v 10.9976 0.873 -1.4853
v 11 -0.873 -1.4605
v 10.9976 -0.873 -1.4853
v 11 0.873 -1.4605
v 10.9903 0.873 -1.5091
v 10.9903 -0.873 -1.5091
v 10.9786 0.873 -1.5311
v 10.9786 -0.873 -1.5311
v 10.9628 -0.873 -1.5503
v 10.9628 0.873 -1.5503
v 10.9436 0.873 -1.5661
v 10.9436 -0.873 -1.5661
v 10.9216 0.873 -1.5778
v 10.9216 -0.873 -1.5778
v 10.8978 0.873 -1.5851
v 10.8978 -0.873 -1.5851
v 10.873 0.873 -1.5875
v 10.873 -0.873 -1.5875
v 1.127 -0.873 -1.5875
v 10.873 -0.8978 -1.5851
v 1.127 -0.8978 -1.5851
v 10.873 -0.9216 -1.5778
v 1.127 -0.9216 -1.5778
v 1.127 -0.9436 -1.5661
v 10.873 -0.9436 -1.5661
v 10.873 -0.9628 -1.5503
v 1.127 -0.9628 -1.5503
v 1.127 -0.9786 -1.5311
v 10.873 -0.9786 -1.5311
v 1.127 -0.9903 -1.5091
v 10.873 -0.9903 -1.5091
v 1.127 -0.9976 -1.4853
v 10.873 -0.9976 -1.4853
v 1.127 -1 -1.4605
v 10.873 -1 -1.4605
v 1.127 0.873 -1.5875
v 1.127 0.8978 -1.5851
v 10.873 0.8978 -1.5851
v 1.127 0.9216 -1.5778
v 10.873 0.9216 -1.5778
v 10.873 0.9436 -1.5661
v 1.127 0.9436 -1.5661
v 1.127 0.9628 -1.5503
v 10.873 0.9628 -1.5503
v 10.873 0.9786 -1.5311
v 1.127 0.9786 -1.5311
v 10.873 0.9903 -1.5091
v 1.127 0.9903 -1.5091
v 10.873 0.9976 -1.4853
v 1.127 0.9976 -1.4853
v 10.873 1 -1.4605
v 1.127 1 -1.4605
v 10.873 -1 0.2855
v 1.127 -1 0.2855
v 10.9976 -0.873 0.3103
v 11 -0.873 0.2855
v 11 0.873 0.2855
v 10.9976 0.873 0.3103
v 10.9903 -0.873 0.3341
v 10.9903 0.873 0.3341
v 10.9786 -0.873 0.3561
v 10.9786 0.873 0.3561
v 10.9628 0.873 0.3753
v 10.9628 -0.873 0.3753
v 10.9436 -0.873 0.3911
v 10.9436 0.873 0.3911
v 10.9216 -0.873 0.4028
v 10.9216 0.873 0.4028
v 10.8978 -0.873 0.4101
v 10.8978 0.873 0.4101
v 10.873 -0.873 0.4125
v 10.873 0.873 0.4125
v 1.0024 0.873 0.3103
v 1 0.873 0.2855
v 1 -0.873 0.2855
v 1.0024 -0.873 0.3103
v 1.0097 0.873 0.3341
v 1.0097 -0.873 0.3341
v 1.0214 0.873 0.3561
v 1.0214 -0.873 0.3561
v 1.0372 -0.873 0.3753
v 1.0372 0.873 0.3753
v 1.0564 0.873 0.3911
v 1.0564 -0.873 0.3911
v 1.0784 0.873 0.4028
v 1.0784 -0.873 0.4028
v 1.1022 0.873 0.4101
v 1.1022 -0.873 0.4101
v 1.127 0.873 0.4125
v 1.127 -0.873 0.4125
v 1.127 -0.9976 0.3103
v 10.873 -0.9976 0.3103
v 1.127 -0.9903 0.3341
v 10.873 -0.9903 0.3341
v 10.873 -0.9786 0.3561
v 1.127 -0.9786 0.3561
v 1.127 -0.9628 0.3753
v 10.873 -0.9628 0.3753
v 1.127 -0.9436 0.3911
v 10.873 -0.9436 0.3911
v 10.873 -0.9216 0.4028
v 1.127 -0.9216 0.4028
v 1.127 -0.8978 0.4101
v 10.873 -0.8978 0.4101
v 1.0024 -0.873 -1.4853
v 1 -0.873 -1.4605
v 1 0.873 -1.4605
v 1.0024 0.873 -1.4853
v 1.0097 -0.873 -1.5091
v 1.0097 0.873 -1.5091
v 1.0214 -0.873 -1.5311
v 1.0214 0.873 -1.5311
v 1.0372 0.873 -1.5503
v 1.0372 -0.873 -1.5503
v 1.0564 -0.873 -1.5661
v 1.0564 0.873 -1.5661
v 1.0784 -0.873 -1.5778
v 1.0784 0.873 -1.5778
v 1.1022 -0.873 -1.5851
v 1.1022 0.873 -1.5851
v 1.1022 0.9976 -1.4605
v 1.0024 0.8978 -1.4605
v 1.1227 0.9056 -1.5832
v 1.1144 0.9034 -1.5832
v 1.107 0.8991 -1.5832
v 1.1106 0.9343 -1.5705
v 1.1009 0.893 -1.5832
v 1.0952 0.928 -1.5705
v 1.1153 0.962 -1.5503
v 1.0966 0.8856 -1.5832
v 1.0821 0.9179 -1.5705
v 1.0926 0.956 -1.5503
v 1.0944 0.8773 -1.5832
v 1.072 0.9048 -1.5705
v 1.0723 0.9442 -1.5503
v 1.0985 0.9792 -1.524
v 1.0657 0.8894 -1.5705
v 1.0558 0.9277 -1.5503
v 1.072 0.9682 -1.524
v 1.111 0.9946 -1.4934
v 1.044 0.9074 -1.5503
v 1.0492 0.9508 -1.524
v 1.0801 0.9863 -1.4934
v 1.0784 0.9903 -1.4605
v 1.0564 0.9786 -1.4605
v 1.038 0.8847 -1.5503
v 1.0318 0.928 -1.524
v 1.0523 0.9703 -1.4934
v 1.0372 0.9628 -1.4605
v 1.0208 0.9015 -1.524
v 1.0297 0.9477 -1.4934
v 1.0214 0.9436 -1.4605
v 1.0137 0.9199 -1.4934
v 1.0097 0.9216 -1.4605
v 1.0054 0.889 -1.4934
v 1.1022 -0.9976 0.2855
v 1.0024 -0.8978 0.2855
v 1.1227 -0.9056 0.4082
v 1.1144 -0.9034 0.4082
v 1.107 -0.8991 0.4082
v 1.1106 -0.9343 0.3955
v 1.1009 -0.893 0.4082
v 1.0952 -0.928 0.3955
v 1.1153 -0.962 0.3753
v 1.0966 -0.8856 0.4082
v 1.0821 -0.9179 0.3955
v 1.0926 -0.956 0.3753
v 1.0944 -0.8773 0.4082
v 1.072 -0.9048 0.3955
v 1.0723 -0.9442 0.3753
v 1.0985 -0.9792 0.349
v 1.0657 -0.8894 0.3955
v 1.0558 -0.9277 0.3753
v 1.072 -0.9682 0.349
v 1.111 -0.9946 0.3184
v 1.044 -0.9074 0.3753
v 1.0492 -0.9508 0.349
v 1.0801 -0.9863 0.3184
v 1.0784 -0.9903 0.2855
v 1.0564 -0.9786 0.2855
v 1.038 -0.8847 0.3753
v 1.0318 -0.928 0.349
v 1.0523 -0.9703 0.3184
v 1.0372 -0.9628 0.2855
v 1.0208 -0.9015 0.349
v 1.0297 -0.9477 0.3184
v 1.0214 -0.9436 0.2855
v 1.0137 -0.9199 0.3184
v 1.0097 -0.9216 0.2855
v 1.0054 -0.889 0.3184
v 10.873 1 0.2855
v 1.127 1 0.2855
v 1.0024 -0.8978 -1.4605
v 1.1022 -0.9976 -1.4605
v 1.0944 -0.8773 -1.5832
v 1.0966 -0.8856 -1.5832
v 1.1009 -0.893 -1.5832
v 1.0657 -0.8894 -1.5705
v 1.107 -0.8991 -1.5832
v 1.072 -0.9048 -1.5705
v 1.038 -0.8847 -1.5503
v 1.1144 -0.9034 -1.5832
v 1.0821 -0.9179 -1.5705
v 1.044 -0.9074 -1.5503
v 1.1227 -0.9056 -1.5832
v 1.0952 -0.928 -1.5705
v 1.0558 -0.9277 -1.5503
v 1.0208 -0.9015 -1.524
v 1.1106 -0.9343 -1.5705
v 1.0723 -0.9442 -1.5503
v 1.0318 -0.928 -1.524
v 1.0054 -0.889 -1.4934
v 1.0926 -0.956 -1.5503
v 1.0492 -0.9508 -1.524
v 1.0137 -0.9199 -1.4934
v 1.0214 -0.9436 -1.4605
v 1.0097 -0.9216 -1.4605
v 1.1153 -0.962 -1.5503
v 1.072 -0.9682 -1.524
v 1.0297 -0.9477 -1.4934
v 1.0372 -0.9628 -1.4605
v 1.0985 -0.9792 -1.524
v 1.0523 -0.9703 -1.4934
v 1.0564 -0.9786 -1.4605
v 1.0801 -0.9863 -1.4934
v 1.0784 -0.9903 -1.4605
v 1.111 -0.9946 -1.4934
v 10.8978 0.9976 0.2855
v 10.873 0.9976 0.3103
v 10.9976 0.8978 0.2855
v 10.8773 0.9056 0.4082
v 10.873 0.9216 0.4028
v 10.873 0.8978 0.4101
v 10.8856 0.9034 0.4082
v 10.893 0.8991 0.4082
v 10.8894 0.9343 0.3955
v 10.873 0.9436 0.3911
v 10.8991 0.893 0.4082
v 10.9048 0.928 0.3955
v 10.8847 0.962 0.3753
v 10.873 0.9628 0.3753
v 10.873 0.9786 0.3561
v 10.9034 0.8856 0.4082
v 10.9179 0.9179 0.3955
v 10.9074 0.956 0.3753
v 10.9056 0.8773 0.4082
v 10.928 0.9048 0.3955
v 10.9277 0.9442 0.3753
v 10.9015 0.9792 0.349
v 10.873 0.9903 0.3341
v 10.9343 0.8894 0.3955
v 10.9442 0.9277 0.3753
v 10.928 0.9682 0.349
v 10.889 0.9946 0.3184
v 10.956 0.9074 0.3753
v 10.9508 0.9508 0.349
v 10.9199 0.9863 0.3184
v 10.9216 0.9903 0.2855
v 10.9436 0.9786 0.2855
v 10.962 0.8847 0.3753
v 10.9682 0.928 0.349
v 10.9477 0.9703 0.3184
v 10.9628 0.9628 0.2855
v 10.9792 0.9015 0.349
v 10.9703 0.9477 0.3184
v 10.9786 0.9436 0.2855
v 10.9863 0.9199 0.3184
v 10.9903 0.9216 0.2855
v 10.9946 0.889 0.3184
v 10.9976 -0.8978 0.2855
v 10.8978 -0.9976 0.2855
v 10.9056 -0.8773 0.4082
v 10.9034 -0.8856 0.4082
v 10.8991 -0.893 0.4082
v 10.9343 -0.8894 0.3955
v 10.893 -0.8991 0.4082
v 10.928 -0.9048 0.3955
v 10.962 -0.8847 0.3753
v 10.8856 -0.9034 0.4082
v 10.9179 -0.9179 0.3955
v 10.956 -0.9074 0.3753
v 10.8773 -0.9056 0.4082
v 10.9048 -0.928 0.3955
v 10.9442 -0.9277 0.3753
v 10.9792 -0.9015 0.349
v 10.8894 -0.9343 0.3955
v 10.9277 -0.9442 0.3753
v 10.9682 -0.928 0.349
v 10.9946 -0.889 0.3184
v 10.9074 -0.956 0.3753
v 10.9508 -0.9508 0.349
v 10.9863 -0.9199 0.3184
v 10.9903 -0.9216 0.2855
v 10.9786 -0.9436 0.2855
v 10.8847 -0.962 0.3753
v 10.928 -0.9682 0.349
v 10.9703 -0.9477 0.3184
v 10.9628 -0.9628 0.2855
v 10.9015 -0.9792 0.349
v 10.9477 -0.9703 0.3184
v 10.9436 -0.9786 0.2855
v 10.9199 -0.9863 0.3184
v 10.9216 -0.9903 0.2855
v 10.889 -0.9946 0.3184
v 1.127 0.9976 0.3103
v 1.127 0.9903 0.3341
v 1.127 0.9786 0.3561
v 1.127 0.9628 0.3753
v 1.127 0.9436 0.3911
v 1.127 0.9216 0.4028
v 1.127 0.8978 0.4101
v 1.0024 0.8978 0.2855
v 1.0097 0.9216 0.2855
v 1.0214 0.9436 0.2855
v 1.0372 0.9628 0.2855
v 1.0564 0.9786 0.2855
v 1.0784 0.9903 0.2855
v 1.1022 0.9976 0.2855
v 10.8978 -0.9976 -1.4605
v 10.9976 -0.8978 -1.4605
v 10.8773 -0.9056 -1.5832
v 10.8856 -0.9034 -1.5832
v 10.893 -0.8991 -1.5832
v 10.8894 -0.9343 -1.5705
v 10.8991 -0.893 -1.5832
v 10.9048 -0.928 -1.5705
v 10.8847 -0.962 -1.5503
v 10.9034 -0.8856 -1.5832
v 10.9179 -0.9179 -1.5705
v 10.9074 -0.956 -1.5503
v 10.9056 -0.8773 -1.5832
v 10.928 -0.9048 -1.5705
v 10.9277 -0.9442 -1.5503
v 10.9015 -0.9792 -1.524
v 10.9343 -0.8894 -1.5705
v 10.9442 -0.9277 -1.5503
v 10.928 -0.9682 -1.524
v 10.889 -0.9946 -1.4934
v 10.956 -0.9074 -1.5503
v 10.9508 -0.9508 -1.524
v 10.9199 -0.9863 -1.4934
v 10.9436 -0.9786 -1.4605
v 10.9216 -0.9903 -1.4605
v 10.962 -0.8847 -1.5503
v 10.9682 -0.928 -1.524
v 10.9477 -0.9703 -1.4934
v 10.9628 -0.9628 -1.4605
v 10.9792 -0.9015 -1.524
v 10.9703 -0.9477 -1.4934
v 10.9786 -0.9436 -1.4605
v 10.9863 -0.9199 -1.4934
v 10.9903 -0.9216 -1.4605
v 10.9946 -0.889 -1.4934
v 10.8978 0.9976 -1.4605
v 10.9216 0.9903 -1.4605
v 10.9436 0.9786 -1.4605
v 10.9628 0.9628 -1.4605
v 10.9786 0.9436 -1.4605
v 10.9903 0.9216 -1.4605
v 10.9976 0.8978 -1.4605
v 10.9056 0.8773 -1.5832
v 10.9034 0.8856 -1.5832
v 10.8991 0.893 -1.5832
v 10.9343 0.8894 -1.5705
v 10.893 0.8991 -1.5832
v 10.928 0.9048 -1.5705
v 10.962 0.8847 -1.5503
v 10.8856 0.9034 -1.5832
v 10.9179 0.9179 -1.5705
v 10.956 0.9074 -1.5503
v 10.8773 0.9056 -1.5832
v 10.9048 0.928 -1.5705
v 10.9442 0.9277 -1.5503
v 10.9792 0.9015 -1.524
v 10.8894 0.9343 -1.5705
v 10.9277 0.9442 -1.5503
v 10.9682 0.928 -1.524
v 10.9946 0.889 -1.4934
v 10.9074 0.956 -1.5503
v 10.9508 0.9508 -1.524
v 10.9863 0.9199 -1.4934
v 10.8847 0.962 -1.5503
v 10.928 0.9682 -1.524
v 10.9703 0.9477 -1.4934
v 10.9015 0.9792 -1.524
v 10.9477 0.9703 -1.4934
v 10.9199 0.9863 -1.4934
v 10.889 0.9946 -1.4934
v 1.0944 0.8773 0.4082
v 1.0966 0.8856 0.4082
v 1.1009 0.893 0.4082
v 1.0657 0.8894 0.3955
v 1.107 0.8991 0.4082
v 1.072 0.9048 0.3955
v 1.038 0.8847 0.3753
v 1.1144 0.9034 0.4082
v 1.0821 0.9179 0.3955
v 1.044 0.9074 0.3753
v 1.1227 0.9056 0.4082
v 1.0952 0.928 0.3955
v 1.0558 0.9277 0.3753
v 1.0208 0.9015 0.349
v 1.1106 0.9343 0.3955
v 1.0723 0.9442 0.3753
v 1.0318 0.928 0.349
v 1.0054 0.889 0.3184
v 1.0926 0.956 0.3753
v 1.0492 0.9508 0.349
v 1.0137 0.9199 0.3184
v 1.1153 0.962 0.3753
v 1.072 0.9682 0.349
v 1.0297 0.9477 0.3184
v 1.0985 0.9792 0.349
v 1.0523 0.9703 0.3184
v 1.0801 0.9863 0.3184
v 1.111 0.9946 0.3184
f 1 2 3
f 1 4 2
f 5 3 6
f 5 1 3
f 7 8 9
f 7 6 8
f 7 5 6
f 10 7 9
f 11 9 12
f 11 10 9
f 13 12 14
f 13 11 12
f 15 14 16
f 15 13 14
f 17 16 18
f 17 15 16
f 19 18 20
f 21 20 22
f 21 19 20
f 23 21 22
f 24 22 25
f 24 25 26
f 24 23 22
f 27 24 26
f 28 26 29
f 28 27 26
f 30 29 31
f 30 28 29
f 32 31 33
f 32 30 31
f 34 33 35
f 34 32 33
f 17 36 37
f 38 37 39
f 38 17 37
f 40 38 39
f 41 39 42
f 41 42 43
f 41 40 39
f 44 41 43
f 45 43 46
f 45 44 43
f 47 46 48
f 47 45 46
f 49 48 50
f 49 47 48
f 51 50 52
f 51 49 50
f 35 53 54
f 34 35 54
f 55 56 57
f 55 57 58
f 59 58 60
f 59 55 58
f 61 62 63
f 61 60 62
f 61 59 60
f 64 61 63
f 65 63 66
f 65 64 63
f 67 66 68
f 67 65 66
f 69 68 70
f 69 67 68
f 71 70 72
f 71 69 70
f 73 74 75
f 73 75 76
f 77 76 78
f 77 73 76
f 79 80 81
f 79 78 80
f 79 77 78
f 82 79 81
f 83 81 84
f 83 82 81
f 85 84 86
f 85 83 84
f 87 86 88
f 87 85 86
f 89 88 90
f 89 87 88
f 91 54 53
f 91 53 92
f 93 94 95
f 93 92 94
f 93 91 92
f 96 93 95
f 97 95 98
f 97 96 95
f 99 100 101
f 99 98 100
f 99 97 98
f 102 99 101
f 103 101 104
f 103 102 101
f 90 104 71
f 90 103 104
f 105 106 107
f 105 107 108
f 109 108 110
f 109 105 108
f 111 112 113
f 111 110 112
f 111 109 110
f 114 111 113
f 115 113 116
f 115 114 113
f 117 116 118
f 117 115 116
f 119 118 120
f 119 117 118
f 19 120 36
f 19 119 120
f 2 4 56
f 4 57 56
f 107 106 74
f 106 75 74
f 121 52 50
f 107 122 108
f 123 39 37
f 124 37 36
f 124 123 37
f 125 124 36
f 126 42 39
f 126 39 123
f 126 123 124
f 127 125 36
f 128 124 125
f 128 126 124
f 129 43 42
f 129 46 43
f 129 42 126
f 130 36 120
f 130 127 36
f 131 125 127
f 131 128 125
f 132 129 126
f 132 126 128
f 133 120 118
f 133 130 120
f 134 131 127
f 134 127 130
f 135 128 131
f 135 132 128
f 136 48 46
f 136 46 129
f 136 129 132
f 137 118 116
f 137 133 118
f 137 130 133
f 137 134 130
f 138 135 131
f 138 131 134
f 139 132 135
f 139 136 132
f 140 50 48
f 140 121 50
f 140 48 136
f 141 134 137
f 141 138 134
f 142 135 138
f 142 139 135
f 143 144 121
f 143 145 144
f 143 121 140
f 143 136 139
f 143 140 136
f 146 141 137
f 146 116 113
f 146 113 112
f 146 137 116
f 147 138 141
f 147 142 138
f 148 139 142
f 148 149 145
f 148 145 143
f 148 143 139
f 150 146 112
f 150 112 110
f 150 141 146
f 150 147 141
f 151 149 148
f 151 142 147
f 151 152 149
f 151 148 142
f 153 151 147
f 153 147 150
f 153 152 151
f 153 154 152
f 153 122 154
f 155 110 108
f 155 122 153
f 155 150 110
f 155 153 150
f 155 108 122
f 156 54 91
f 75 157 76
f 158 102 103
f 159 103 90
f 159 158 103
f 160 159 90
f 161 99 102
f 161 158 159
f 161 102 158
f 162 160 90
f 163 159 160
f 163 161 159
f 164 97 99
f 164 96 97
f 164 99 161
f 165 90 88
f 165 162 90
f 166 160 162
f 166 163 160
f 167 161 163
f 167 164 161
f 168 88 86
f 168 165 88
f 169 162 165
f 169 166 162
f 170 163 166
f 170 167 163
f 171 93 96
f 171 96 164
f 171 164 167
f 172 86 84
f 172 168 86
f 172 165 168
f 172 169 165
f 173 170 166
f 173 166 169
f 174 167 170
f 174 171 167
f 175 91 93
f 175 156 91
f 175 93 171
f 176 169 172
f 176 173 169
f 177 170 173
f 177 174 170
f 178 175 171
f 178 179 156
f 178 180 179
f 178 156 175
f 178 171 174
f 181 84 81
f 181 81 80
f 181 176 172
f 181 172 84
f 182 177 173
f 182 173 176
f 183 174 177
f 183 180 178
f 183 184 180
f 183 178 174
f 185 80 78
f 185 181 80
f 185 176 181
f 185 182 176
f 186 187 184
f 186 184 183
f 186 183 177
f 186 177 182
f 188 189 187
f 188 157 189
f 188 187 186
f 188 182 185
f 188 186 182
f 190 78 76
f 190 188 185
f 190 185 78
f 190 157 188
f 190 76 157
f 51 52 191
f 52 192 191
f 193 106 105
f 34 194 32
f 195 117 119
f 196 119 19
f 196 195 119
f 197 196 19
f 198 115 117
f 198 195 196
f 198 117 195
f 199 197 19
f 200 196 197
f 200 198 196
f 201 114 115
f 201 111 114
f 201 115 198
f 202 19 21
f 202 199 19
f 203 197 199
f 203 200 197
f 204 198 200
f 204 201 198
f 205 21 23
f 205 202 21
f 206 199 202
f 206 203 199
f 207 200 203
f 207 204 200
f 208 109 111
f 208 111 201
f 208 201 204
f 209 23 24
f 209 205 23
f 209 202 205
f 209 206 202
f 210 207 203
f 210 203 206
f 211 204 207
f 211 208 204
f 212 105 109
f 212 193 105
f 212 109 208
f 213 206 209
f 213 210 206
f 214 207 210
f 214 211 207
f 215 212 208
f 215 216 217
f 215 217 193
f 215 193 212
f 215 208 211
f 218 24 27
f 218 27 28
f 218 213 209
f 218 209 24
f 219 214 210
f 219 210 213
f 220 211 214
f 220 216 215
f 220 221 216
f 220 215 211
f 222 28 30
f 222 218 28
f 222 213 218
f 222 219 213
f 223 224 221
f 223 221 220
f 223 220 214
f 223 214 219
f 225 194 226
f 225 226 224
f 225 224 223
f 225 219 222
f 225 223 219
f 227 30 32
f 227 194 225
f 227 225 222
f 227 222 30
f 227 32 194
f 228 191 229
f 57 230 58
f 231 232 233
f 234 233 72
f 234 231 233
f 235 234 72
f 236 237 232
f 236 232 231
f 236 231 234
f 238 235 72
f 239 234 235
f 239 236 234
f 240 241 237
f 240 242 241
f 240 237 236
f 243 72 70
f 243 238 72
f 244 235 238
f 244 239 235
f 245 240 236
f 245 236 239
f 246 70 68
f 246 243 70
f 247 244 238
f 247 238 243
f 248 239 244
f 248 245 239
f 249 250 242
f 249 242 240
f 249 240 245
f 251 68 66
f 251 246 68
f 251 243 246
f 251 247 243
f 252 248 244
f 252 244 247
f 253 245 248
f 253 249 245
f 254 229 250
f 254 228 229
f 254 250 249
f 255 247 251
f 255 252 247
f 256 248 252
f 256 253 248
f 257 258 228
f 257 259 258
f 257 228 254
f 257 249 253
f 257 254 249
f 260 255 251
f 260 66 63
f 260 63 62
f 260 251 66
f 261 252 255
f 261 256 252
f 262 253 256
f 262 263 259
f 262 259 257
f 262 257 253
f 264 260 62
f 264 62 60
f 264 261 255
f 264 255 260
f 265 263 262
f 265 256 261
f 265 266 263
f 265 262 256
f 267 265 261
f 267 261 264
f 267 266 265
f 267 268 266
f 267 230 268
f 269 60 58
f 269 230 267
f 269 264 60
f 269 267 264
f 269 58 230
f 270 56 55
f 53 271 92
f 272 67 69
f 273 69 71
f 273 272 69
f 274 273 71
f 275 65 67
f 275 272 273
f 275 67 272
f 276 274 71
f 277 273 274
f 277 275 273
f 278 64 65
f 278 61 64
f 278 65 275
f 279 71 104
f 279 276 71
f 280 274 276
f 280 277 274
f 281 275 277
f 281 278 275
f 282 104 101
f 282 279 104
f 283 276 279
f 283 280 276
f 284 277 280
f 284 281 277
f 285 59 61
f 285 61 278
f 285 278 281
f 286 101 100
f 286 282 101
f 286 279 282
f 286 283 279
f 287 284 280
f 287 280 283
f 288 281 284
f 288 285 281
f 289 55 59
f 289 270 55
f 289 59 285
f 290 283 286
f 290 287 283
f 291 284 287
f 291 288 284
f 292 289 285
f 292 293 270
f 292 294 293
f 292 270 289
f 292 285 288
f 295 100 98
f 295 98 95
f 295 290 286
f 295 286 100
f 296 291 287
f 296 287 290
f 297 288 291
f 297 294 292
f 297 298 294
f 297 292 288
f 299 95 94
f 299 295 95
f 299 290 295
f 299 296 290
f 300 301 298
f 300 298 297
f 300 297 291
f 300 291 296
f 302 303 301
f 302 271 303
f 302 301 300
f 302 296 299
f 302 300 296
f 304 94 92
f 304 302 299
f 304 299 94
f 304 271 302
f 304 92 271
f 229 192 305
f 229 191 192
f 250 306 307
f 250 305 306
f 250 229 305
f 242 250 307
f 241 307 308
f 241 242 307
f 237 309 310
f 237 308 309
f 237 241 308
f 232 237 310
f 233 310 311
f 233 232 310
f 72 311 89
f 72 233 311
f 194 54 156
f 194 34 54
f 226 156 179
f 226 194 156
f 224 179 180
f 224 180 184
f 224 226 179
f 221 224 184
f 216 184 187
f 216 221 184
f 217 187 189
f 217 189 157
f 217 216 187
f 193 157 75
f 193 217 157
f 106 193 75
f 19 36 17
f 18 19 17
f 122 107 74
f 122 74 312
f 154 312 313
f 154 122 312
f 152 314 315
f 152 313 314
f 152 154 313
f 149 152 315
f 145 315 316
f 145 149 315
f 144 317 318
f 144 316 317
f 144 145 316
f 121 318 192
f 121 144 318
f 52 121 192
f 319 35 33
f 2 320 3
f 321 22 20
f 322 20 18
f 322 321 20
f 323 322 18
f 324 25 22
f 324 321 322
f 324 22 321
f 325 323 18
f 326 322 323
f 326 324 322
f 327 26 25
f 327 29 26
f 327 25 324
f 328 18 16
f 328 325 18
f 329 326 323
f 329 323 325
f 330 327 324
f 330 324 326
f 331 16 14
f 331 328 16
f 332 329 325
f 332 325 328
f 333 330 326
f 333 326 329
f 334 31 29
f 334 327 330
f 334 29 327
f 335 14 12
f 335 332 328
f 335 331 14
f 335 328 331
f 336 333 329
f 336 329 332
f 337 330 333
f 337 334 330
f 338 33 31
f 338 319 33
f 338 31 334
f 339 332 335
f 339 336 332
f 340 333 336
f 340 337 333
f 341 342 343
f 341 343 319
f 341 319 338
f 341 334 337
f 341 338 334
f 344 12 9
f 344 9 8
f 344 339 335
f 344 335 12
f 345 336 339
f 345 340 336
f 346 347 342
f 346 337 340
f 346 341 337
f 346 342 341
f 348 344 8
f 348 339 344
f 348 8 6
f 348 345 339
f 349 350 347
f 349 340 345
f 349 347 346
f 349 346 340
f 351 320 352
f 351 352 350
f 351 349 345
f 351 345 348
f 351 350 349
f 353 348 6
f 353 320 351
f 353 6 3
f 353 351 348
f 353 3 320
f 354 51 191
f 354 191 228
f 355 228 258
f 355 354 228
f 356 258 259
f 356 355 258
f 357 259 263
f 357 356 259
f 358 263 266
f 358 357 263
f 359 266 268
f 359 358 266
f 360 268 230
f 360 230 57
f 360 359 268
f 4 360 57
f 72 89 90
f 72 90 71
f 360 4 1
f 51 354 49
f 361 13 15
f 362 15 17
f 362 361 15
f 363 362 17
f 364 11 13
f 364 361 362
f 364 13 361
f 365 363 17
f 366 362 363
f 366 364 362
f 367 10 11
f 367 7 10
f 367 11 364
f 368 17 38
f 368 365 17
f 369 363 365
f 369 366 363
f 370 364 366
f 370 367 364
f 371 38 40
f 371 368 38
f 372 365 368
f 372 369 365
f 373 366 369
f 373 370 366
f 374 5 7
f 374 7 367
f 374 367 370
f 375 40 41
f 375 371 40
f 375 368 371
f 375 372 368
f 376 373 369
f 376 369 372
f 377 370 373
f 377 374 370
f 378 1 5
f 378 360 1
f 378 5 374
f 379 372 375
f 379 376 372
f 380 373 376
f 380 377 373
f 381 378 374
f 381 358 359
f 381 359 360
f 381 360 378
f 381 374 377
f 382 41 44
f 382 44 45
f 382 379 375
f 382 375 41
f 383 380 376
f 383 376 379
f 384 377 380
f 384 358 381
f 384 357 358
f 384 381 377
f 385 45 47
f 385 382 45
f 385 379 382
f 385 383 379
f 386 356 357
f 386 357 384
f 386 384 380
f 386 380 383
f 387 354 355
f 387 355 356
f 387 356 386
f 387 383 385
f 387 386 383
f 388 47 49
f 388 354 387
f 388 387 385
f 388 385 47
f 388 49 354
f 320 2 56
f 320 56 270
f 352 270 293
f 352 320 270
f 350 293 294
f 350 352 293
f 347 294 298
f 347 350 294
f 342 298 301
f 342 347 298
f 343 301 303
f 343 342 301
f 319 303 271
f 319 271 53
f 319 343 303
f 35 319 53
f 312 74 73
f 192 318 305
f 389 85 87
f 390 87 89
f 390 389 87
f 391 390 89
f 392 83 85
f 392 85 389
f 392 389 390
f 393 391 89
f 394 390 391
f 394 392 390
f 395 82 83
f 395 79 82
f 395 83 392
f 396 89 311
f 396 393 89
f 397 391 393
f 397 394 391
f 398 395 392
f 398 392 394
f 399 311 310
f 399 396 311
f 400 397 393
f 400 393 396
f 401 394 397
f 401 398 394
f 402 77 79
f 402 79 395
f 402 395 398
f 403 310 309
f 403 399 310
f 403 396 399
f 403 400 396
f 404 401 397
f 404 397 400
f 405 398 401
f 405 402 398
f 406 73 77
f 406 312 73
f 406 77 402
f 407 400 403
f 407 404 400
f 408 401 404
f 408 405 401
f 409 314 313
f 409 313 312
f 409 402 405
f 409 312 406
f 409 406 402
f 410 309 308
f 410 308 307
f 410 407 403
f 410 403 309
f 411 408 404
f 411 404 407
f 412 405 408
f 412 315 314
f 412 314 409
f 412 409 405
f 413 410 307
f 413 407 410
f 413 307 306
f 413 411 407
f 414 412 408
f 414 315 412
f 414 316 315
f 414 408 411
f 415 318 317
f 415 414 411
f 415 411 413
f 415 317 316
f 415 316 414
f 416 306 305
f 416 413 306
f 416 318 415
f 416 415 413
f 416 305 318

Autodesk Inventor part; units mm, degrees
ref_plane "YZ Plane" through (0, 0, 0) normal (1, 0, 0) x (0, 1, 0)
sketch "Sketch1" plane through (0, 0, 0) normal (0, 0, 1) x (1, 0, 0)
  line L0 (1, 1) -> (11, 1)
  line L1 (11, 1) -> (11, -1)
  line L2 (11, -1) -> (1, -1)
  line L3 (1, -1) -> (1, 1)
  arc A0 (1, 1) -> (1, -1) centre (1, 0) ccw construction
  line L4 (0, 1.4) -> (0, -1.4) projected
  line L5 (-3.756, 0) -> (22.536, 0) projected
  dimension "d0" = 1
  dimension "d1" = 10
ref_plane "IDS_WORKPLANE{1}" through (0, 0, -1.5875) normal (0, 0, 1) x (1, 0, 0)
ref_plane "IDS_WORKPLANE{2}" through (0, 0, 0.4125) normal (0, 0, 1) x (1, 0, 0)
extrude "Body1" add sketch "Sketch1" against normal up to surface (2 mm away) from surface at 0.4125
fillet "Fillet1" radius 0.127 14 edges at (1, 1, -0.5875) (11, 1, -0.5875) (6, 1, 0.4125) (6, 1, -1.5875) (11, -1, -0.5875) (11, 0, 0.4125) (11, 0, -1.5875) (1, -1, -0.5875) (6, -1, 0.4125) (6, -1, -1.5875) (1, -0.5, 0.4125) (1, -0.5, -1.5875) (1, 0.5, 0.4125) (1, 0.5, -1.5875)
equation "\"d0\" = 0.5 * PB"
equation "\"d1\" = NLG"
equation "\"d2\" = -PNT"
equation "\"d3\" = PB - PNT"
equation "\"NLG\" = 10"
equation "\"PB\" = 2"
equation "\"PNT\" = 1.5875"
properties part number "am-1121" material "Steel, Mild"
